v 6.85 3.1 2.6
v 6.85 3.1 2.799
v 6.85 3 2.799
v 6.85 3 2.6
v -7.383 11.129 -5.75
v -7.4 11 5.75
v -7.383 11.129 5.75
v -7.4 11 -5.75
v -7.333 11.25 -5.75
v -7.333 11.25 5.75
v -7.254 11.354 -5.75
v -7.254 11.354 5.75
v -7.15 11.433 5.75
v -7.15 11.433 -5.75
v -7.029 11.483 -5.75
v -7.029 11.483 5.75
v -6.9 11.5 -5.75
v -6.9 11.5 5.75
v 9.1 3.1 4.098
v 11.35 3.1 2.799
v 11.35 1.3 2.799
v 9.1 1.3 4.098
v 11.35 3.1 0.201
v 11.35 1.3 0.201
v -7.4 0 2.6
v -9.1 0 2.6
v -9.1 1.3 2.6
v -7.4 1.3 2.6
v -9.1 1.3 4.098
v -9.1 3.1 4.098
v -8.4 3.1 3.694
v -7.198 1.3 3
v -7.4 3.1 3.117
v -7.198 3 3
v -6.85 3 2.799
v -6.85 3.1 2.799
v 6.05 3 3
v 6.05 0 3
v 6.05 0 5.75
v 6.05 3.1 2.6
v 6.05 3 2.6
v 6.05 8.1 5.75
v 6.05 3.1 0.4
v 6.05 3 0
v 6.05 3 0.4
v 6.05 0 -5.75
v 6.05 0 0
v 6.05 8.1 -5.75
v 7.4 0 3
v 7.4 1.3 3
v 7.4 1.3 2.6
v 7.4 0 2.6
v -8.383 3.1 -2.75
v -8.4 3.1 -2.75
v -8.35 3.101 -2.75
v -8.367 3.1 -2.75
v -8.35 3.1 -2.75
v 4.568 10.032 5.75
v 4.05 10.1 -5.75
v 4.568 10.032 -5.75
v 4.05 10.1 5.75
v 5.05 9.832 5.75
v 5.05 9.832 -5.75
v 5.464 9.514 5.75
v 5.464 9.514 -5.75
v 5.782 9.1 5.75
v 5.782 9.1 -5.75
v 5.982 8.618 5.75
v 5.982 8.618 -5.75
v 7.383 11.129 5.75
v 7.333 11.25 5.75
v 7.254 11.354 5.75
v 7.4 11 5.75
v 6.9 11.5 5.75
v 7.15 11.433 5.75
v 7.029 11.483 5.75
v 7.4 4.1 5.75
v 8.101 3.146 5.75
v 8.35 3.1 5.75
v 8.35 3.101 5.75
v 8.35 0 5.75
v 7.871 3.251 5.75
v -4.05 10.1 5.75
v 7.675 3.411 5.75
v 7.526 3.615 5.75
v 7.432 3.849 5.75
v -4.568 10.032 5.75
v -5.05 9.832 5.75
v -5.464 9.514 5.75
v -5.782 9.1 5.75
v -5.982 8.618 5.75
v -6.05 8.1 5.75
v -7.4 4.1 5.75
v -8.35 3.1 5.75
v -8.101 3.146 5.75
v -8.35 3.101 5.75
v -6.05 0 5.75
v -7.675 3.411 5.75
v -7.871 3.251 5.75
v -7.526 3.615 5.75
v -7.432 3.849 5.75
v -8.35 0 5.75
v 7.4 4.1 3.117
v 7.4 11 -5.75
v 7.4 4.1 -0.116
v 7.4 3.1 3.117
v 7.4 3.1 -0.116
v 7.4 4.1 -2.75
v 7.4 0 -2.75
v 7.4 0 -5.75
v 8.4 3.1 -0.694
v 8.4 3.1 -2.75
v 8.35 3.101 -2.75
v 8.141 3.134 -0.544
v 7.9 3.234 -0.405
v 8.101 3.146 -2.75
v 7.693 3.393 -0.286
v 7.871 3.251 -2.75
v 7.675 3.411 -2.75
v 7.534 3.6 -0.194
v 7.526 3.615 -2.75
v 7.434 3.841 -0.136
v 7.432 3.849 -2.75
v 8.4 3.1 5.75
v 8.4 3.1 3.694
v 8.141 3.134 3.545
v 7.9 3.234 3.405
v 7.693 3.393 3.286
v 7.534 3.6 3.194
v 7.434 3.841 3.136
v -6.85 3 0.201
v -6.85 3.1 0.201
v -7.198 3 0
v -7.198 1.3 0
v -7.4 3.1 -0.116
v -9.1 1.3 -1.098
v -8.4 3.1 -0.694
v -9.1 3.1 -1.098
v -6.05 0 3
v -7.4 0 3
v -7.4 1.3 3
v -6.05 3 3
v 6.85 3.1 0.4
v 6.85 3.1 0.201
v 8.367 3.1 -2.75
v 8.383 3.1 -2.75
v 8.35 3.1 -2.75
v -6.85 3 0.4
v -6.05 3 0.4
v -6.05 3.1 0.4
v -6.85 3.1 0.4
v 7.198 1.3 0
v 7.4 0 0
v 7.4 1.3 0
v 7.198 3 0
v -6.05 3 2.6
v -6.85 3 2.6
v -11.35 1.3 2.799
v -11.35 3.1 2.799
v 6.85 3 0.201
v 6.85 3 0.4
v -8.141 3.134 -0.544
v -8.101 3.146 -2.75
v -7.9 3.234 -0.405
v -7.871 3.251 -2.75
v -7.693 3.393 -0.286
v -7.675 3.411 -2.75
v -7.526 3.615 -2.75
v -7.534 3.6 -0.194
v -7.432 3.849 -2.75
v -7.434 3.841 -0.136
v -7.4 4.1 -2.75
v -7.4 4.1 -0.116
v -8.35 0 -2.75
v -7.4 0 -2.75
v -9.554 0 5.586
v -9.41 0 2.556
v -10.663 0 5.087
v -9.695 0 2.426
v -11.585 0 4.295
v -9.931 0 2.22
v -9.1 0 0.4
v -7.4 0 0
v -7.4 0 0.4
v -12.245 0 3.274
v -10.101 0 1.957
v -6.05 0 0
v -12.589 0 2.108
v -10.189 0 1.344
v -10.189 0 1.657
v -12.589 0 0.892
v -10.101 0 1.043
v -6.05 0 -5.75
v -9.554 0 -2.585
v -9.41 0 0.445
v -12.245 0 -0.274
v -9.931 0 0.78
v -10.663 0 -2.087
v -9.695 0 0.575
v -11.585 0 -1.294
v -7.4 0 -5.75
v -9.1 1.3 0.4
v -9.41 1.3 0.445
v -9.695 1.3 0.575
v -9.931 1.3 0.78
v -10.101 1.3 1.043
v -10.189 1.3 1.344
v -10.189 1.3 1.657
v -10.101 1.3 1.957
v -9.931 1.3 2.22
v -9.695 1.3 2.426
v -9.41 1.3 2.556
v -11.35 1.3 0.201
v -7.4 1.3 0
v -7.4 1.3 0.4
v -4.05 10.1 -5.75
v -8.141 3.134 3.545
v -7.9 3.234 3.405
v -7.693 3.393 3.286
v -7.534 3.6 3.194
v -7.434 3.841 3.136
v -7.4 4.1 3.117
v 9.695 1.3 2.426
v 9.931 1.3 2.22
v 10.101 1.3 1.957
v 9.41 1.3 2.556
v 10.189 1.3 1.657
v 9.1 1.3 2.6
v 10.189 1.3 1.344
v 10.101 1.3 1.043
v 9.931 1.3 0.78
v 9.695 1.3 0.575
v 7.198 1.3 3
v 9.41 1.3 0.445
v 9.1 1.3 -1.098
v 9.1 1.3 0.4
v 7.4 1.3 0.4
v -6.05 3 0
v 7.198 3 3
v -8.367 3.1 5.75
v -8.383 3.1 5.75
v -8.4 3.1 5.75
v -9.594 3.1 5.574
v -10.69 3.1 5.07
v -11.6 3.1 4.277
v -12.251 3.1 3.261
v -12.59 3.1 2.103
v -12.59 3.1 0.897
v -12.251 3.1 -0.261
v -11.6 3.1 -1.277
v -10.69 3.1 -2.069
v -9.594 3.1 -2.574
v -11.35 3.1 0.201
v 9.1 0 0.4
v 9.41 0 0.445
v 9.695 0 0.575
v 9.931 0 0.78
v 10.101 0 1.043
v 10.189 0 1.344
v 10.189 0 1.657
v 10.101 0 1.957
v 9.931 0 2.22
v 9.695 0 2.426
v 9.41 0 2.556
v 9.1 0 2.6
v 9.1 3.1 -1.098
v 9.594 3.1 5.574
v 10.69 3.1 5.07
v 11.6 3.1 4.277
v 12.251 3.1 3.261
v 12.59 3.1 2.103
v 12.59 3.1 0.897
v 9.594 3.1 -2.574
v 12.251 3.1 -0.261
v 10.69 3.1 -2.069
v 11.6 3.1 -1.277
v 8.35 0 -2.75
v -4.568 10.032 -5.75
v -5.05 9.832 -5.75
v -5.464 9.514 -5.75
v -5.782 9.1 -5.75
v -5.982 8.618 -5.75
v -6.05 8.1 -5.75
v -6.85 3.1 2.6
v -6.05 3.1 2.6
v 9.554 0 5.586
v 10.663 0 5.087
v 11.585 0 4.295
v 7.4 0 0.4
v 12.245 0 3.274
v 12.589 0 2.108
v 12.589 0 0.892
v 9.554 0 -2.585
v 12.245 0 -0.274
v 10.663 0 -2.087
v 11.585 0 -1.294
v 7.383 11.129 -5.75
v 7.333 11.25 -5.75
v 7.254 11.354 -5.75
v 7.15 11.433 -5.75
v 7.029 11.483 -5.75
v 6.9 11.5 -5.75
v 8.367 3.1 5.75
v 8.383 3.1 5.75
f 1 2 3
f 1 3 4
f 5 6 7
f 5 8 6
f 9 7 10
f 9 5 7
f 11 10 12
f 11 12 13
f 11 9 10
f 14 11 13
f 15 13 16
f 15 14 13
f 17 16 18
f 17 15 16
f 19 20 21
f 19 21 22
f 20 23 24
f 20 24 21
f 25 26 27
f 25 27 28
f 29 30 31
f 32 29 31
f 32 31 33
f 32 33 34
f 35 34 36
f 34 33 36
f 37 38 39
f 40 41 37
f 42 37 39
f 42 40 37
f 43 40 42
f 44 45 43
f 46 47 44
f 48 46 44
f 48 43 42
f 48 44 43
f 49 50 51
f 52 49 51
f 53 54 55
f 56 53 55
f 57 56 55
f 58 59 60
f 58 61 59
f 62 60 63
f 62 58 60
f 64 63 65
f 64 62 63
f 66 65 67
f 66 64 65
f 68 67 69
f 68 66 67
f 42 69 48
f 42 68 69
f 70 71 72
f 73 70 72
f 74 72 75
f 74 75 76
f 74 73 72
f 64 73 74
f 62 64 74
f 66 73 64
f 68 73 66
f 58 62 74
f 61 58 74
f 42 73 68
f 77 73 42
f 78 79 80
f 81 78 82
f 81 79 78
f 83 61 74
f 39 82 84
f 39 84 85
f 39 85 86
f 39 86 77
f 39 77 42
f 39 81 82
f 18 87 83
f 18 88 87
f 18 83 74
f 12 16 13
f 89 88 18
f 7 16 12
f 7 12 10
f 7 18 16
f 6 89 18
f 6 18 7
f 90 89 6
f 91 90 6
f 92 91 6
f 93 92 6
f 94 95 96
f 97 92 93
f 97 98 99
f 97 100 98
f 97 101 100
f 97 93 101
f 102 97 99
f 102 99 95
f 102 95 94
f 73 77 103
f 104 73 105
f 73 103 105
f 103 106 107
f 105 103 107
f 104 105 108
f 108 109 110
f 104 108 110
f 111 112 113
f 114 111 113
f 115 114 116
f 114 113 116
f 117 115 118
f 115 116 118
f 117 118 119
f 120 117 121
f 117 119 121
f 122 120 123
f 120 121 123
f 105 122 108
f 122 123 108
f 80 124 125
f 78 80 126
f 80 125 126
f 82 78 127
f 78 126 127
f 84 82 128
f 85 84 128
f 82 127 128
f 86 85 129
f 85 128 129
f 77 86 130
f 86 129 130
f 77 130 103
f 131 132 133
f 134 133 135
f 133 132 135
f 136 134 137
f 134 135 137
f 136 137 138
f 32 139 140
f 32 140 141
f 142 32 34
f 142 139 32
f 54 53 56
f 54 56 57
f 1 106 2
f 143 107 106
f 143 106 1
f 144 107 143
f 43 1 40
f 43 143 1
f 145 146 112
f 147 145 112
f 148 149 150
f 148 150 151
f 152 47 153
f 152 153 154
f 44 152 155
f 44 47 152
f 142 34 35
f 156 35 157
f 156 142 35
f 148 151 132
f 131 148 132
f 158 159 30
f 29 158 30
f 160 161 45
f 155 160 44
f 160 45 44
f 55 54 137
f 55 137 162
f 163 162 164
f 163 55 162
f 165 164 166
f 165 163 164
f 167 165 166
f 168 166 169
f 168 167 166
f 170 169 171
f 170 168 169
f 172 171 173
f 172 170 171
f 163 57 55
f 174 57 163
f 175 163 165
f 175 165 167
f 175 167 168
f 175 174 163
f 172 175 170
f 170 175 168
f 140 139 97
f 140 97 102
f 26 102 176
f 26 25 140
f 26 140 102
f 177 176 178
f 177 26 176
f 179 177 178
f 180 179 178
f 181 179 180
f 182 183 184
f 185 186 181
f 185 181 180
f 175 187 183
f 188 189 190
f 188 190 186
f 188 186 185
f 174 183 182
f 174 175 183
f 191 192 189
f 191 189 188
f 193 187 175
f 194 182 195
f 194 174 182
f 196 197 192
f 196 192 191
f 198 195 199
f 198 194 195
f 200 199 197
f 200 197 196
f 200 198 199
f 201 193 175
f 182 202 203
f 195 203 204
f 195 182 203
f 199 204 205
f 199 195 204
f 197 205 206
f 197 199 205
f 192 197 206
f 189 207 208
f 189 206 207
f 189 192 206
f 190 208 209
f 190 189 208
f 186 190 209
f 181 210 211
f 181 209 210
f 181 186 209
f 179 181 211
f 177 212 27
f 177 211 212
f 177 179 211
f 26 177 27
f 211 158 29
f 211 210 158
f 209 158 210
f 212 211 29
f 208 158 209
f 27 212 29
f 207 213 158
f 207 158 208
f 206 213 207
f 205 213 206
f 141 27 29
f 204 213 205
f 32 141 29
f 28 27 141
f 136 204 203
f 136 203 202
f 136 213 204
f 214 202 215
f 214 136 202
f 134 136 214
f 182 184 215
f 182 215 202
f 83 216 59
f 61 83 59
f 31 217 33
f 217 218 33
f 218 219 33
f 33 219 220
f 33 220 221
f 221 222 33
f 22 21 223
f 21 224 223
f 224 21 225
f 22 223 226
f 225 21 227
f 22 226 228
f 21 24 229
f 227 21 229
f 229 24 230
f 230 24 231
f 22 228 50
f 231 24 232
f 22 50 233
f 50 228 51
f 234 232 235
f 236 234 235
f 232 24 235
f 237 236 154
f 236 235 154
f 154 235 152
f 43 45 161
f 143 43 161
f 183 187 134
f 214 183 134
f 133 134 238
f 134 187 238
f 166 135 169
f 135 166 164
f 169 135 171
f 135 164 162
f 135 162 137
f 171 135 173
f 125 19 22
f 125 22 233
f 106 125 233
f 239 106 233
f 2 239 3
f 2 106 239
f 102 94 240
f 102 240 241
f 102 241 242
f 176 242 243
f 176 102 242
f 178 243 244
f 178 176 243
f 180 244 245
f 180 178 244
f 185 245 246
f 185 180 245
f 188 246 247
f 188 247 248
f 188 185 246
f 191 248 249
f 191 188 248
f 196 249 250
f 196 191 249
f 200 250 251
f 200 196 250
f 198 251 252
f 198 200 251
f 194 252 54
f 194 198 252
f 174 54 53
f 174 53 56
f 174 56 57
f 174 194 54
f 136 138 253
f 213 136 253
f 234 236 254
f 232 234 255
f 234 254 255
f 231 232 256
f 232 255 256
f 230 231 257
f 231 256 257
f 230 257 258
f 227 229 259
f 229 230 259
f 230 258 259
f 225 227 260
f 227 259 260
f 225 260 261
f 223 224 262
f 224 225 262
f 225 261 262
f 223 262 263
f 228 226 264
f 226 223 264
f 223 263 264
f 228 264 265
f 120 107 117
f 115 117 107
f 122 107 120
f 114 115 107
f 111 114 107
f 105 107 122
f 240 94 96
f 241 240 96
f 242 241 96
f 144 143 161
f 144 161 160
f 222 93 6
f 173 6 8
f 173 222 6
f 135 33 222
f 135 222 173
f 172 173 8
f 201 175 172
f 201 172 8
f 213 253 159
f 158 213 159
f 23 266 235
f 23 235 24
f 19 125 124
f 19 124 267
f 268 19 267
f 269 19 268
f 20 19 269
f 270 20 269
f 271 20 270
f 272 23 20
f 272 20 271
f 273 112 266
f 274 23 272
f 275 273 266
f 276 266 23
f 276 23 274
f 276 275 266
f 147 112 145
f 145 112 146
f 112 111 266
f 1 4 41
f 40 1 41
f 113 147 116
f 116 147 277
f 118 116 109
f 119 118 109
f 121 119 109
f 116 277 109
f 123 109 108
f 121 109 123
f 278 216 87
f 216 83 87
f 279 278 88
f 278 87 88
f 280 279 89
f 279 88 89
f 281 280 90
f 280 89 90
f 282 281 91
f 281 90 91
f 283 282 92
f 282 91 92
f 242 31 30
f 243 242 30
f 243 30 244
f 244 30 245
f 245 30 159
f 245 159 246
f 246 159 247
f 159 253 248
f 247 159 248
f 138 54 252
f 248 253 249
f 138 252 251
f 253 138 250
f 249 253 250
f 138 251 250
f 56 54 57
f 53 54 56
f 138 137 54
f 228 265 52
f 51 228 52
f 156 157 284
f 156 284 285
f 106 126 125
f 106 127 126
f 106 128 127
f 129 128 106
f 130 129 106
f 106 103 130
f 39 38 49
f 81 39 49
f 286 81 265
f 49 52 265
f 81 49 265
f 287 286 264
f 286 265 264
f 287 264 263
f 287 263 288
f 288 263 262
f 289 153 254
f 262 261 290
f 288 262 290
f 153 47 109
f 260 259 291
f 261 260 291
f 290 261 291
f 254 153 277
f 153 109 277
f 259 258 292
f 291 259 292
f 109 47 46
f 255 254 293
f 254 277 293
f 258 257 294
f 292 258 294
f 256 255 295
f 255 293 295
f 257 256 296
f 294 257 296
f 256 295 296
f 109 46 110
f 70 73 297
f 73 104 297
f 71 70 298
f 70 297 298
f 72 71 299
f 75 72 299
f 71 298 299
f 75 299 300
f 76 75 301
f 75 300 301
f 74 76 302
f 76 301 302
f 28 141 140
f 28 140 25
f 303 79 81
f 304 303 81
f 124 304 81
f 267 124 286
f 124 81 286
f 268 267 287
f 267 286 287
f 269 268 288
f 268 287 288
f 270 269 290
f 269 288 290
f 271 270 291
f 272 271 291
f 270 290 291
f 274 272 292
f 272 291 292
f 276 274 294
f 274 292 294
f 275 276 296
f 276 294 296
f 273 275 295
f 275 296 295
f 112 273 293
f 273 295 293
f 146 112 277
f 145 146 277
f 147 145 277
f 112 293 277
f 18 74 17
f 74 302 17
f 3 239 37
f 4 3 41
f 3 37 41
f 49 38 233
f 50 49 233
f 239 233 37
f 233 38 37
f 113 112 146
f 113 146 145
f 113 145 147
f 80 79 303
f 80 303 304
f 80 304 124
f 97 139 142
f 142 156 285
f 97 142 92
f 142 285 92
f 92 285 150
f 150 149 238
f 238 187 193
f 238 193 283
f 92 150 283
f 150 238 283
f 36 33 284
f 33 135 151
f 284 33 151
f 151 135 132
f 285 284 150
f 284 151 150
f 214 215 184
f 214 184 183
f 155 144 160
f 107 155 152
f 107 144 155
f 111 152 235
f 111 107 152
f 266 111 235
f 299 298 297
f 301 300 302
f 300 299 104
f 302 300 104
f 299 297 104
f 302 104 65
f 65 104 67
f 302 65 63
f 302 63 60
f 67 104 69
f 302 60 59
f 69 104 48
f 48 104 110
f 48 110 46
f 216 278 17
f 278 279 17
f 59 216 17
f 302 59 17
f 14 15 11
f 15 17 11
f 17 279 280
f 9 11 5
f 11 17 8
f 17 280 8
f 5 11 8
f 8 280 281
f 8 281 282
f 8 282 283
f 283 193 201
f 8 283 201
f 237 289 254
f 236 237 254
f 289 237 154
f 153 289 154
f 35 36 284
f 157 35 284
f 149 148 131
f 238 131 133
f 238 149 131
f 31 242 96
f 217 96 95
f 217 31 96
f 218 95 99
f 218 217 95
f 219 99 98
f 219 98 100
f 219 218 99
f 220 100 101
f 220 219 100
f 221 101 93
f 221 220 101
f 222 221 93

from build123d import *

# Parameters (mm, degrees)
SKETCH1_W           = 7.4
SKETCH1_H           = 11.5
BOSS_EXTRUDE1_DEPTH = 11.5
BOSS_EXTRUDE2_DEPTH = 3.1
SKETCH6_W           = 6.05
SKETCH6_H           = 10.1
CUT_EXTRUDE1_DEPTH  = 21.593612692
CUT_EXTRUDE2_DEPTH  = 3.1
SKETCH8_W           = 3
SKETCH8_H           = 3
CUT_EXTRUDE3_DEPTH  = 1.35
CUT_EXTRUDE4_DEPTH  = 1.8
FILLET1_R           = 1
FILLET2_R           = 0.5
FILLET3_R           = 2


# Read off the part's stored shape, not the designer's step: Mirror3
with BuildPart() as part:
    # Sketch1 → Boss-Extrude1 (new body)
    with BuildSketch(Plane(origin=(0, 0, 0), x_dir=(1, 0, 0), z_dir=(0, 1, 0))):
        with Locations((-3.7, 0)):
            Rectangle(SKETCH1_W, SKETCH1_H)
    extrude(amount=BOSS_EXTRUDE1_DEPTH)

    # Sketch3 → Boss-Extrude2 (add)
    with BuildSketch(Plane(origin=(0, 0, 0), x_dir=(1, 0, 0), z_dir=(0, 1, 0))):
        with BuildLine():
            Line((-8.35, 2.749742999), (-7.4, 2.749742999))
            Line((-7.4, 2.749742999), (-7.4, -5.75))
            Line((-7.4, -5.75), (-8.35, -5.75))
            ThreePointArc((-8.35, -5.75), (-12.633049046, -1.500128501), (-8.35, 2.749742999))
        make_face()
    extrude(amount=BOSS_EXTRUDE2_DEPTH)

    # Sketch6 → Cut-Extrude1 (cut, through all)
    with BuildSketch(Plane(origin=(0, 0, -5.75), x_dir=(-1, 0, 0), z_dir=(0, 0, -1))):
        with Locations((3.025, 5.05)):
            Rectangle(SKETCH6_W, SKETCH6_H)
    extrude(amount=-CUT_EXTRUDE1_DEPTH, mode=Mode.SUBTRACT)

    # Sketch7 → Cut-Extrude2 (cut)
    with BuildSketch(Plane.XZ):
        with BuildLine():
            Line((-9.1, 2.600128501), (-6.05, 2.600128501))
            ThreePointArc((-6.05, 2.600128501), (-4.95, 1.500128501), (-6.05, 0.400128501))
            Line((-6.05, 0.400128501), (-9.1, 0.400128501))
            ThreePointArc((-9.1, 0.400128501), (-10.2, 1.500128501), (-9.1, 2.600128501))
        make_face()
    extrude(amount=-CUT_EXTRUDE2_DEPTH, mode=Mode.SUBTRACT)

    # Sketch8 → Cut-Extrude3 (cut)
    with BuildSketch(Plane(origin=(-6.05, 0, 0), x_dir=(0, 0, -1), z_dir=(1, 0, 0))):
        with Locations((-1.500128501, 1.5)):
            Rectangle(SKETCH8_W, SKETCH8_H)
    extrude(amount=-CUT_EXTRUDE3_DEPTH, mode=Mode.SUBTRACT)

    # Sketch9 → Cut-Extrude4 (cut)
    with BuildSketch(Plane(origin=(0, 3.1, 0), x_dir=(1, 0, 0), z_dir=(0, 1, 0))):
        Polygon((-6.85, -2.799166606), (-6.85, -0.201090395), (-9.1, 1.097947711), (-11.35, -0.201090395), (-11.35, -2.799166606), (-9.1, -4.098204712), align=None)
    extrude(amount=-CUT_EXTRUDE4_DEPTH, mode=Mode.SUBTRACT)

    # Fillet1
    # the kernel refuses this fillet: 1 mm, written as the material it adds along each edge
    with BuildSketch(Plane(origin=(-7.4, 3.1, -2.749742999), x_dir=(-1, 0, 0), z_dir=(0, 0, 1))) as fillet1_piece_1_section:
        with BuildLine():
            CenterArc((FILLET1_R, -FILLET1_R), FILLET1_R, 90, 90)
            Line((0, -FILLET1_R), (0, 0))
            Line((0, 0), (FILLET1_R, 0))
        make_face()
    fillet1_piece_1 = extrude(amount=5.133290746, mode=Mode.PRIVATE)
    fillet1_piece_1 = split(fillet1_piece_1, bisect_by=Plane(origin=(-8.63172693, 3.371201356, -0.827590128), z_dir=(0.49999999999999983, 0, -0.8660254037844388)), keep=Keep.TOP, mode=Mode.PRIVATE)
    add(fillet1_piece_1)
    with BuildSketch(Plane(origin=(-7.4, 3.1, -5.249742999), x_dir=(-1, 0, 0), z_dir=(0, 0, 1))) as fillet1_piece_2_section:
        with BuildLine():
            CenterArc((FILLET1_R, -FILLET1_R), FILLET1_R, 90, 90)
            Line((0, -FILLET1_R), (0, 0))
            Line((0, 0), (FILLET1_R, 0))
        make_face()
    fillet1_piece_2 = extrude(amount=7.633290746, mode=Mode.PRIVATE)
    fillet1_piece_2 = fillet1_piece_2 & Plane(origin=(-8.383049046, 3.100281112, 1.500128501), x_dir=(0.007776246012108559, 0, 0.9999697645418881), z_dir=(0, -1, 0)) * Cylinder(4.25, 20, mode=Mode.PRIVATE)
    fillet1_piece_2 = split(fillet1_piece_2, bisect_by=Plane(origin=(-9.26614006, 3.100281112, -1.193868719), z_dir=(0.49999999999999983, 0, -0.8660254037844388)), keep=Keep.TOP, mode=Mode.PRIVATE)
    add(fillet1_piece_2)
    with BuildSketch(Plane(origin=(-7.4, 3.1, 0.616709254), x_dir=(-1, 0, 0), z_dir=(0, 0, 1))) as fillet1_piece_3_section:
        with BuildLine():
            CenterArc((FILLET1_R, -FILLET1_R), FILLET1_R, 90, 90)
            Line((0, -FILLET1_R), (0, 0))
            Line((0, 0), (FILLET1_R, 0))
        make_face()
    fillet1_piece_3 = extrude(amount=5.133290746, mode=Mode.PRIVATE)
    fillet1_piece_3 = split(fillet1_piece_3, bisect_by=Plane(origin=(-8.144343012, 3.326849972, 3.546455893), z_dir=(0.5000000000000008, 0, 0.8660254037844383)), keep=Keep.TOP, mode=Mode.PRIVATE)
    add(fillet1_piece_3)
    with BuildSketch(Plane(origin=(-7.4, 3.1, 0.616709254), x_dir=(-1, 0, 0), z_dir=(0, 0, 1))) as fillet1_piece_4_section:
        with BuildLine():
            CenterArc((FILLET1_R, -FILLET1_R), FILLET1_R, 90, 90)
            Line((0, -FILLET1_R), (0, 0))
            Line((0, 0), (FILLET1_R, 0))
        make_face()
    fillet1_piece_4 = extrude(amount=7.633290746, mode=Mode.PRIVATE)
    fillet1_piece_4 = fillet1_piece_4 & Plane(origin=(-8.383049046, 3.100281111, 1.500128501), x_dir=(0.007776246012108559, 0, 0.9999697645418881), z_dir=(0, -1, 0)) * Cylinder(4.25, 20, mode=Mode.PRIVATE)
    fillet1_piece_4 = split(fillet1_piece_4, bisect_by=Plane(origin=(-9.266139995, 3.100281111, 4.194125683), z_dir=(0.5000000000000008, 0, 0.8660254037844383)), keep=Keep.TOP, mode=Mode.PRIVATE)
    add(fillet1_piece_4)

    # Fillet2
    fillet2_edges = [part.edges().sort_by_distance(p)[0] for p in [
        (-7.4, 11.5, 0),
    ]]
    fillet(fillet2_edges, radius=FILLET2_R)

    # Fillet3
    fillet3_edges = [part.edges().sort_by_distance(p)[0] for p in [
        (-6.05, 10.1, 0),
    ]]
    fillet(fillet3_edges, radius=FILLET3_R)

    # Mirror3: part across plane


with BuildPart() as part_1:
    add(part.part)
    add(part.part.mirror(Plane(origin=(0, 0, 0), x_dir=(0, 0, 1), z_dir=(1, 0, 0))))


solid = part_1.part
